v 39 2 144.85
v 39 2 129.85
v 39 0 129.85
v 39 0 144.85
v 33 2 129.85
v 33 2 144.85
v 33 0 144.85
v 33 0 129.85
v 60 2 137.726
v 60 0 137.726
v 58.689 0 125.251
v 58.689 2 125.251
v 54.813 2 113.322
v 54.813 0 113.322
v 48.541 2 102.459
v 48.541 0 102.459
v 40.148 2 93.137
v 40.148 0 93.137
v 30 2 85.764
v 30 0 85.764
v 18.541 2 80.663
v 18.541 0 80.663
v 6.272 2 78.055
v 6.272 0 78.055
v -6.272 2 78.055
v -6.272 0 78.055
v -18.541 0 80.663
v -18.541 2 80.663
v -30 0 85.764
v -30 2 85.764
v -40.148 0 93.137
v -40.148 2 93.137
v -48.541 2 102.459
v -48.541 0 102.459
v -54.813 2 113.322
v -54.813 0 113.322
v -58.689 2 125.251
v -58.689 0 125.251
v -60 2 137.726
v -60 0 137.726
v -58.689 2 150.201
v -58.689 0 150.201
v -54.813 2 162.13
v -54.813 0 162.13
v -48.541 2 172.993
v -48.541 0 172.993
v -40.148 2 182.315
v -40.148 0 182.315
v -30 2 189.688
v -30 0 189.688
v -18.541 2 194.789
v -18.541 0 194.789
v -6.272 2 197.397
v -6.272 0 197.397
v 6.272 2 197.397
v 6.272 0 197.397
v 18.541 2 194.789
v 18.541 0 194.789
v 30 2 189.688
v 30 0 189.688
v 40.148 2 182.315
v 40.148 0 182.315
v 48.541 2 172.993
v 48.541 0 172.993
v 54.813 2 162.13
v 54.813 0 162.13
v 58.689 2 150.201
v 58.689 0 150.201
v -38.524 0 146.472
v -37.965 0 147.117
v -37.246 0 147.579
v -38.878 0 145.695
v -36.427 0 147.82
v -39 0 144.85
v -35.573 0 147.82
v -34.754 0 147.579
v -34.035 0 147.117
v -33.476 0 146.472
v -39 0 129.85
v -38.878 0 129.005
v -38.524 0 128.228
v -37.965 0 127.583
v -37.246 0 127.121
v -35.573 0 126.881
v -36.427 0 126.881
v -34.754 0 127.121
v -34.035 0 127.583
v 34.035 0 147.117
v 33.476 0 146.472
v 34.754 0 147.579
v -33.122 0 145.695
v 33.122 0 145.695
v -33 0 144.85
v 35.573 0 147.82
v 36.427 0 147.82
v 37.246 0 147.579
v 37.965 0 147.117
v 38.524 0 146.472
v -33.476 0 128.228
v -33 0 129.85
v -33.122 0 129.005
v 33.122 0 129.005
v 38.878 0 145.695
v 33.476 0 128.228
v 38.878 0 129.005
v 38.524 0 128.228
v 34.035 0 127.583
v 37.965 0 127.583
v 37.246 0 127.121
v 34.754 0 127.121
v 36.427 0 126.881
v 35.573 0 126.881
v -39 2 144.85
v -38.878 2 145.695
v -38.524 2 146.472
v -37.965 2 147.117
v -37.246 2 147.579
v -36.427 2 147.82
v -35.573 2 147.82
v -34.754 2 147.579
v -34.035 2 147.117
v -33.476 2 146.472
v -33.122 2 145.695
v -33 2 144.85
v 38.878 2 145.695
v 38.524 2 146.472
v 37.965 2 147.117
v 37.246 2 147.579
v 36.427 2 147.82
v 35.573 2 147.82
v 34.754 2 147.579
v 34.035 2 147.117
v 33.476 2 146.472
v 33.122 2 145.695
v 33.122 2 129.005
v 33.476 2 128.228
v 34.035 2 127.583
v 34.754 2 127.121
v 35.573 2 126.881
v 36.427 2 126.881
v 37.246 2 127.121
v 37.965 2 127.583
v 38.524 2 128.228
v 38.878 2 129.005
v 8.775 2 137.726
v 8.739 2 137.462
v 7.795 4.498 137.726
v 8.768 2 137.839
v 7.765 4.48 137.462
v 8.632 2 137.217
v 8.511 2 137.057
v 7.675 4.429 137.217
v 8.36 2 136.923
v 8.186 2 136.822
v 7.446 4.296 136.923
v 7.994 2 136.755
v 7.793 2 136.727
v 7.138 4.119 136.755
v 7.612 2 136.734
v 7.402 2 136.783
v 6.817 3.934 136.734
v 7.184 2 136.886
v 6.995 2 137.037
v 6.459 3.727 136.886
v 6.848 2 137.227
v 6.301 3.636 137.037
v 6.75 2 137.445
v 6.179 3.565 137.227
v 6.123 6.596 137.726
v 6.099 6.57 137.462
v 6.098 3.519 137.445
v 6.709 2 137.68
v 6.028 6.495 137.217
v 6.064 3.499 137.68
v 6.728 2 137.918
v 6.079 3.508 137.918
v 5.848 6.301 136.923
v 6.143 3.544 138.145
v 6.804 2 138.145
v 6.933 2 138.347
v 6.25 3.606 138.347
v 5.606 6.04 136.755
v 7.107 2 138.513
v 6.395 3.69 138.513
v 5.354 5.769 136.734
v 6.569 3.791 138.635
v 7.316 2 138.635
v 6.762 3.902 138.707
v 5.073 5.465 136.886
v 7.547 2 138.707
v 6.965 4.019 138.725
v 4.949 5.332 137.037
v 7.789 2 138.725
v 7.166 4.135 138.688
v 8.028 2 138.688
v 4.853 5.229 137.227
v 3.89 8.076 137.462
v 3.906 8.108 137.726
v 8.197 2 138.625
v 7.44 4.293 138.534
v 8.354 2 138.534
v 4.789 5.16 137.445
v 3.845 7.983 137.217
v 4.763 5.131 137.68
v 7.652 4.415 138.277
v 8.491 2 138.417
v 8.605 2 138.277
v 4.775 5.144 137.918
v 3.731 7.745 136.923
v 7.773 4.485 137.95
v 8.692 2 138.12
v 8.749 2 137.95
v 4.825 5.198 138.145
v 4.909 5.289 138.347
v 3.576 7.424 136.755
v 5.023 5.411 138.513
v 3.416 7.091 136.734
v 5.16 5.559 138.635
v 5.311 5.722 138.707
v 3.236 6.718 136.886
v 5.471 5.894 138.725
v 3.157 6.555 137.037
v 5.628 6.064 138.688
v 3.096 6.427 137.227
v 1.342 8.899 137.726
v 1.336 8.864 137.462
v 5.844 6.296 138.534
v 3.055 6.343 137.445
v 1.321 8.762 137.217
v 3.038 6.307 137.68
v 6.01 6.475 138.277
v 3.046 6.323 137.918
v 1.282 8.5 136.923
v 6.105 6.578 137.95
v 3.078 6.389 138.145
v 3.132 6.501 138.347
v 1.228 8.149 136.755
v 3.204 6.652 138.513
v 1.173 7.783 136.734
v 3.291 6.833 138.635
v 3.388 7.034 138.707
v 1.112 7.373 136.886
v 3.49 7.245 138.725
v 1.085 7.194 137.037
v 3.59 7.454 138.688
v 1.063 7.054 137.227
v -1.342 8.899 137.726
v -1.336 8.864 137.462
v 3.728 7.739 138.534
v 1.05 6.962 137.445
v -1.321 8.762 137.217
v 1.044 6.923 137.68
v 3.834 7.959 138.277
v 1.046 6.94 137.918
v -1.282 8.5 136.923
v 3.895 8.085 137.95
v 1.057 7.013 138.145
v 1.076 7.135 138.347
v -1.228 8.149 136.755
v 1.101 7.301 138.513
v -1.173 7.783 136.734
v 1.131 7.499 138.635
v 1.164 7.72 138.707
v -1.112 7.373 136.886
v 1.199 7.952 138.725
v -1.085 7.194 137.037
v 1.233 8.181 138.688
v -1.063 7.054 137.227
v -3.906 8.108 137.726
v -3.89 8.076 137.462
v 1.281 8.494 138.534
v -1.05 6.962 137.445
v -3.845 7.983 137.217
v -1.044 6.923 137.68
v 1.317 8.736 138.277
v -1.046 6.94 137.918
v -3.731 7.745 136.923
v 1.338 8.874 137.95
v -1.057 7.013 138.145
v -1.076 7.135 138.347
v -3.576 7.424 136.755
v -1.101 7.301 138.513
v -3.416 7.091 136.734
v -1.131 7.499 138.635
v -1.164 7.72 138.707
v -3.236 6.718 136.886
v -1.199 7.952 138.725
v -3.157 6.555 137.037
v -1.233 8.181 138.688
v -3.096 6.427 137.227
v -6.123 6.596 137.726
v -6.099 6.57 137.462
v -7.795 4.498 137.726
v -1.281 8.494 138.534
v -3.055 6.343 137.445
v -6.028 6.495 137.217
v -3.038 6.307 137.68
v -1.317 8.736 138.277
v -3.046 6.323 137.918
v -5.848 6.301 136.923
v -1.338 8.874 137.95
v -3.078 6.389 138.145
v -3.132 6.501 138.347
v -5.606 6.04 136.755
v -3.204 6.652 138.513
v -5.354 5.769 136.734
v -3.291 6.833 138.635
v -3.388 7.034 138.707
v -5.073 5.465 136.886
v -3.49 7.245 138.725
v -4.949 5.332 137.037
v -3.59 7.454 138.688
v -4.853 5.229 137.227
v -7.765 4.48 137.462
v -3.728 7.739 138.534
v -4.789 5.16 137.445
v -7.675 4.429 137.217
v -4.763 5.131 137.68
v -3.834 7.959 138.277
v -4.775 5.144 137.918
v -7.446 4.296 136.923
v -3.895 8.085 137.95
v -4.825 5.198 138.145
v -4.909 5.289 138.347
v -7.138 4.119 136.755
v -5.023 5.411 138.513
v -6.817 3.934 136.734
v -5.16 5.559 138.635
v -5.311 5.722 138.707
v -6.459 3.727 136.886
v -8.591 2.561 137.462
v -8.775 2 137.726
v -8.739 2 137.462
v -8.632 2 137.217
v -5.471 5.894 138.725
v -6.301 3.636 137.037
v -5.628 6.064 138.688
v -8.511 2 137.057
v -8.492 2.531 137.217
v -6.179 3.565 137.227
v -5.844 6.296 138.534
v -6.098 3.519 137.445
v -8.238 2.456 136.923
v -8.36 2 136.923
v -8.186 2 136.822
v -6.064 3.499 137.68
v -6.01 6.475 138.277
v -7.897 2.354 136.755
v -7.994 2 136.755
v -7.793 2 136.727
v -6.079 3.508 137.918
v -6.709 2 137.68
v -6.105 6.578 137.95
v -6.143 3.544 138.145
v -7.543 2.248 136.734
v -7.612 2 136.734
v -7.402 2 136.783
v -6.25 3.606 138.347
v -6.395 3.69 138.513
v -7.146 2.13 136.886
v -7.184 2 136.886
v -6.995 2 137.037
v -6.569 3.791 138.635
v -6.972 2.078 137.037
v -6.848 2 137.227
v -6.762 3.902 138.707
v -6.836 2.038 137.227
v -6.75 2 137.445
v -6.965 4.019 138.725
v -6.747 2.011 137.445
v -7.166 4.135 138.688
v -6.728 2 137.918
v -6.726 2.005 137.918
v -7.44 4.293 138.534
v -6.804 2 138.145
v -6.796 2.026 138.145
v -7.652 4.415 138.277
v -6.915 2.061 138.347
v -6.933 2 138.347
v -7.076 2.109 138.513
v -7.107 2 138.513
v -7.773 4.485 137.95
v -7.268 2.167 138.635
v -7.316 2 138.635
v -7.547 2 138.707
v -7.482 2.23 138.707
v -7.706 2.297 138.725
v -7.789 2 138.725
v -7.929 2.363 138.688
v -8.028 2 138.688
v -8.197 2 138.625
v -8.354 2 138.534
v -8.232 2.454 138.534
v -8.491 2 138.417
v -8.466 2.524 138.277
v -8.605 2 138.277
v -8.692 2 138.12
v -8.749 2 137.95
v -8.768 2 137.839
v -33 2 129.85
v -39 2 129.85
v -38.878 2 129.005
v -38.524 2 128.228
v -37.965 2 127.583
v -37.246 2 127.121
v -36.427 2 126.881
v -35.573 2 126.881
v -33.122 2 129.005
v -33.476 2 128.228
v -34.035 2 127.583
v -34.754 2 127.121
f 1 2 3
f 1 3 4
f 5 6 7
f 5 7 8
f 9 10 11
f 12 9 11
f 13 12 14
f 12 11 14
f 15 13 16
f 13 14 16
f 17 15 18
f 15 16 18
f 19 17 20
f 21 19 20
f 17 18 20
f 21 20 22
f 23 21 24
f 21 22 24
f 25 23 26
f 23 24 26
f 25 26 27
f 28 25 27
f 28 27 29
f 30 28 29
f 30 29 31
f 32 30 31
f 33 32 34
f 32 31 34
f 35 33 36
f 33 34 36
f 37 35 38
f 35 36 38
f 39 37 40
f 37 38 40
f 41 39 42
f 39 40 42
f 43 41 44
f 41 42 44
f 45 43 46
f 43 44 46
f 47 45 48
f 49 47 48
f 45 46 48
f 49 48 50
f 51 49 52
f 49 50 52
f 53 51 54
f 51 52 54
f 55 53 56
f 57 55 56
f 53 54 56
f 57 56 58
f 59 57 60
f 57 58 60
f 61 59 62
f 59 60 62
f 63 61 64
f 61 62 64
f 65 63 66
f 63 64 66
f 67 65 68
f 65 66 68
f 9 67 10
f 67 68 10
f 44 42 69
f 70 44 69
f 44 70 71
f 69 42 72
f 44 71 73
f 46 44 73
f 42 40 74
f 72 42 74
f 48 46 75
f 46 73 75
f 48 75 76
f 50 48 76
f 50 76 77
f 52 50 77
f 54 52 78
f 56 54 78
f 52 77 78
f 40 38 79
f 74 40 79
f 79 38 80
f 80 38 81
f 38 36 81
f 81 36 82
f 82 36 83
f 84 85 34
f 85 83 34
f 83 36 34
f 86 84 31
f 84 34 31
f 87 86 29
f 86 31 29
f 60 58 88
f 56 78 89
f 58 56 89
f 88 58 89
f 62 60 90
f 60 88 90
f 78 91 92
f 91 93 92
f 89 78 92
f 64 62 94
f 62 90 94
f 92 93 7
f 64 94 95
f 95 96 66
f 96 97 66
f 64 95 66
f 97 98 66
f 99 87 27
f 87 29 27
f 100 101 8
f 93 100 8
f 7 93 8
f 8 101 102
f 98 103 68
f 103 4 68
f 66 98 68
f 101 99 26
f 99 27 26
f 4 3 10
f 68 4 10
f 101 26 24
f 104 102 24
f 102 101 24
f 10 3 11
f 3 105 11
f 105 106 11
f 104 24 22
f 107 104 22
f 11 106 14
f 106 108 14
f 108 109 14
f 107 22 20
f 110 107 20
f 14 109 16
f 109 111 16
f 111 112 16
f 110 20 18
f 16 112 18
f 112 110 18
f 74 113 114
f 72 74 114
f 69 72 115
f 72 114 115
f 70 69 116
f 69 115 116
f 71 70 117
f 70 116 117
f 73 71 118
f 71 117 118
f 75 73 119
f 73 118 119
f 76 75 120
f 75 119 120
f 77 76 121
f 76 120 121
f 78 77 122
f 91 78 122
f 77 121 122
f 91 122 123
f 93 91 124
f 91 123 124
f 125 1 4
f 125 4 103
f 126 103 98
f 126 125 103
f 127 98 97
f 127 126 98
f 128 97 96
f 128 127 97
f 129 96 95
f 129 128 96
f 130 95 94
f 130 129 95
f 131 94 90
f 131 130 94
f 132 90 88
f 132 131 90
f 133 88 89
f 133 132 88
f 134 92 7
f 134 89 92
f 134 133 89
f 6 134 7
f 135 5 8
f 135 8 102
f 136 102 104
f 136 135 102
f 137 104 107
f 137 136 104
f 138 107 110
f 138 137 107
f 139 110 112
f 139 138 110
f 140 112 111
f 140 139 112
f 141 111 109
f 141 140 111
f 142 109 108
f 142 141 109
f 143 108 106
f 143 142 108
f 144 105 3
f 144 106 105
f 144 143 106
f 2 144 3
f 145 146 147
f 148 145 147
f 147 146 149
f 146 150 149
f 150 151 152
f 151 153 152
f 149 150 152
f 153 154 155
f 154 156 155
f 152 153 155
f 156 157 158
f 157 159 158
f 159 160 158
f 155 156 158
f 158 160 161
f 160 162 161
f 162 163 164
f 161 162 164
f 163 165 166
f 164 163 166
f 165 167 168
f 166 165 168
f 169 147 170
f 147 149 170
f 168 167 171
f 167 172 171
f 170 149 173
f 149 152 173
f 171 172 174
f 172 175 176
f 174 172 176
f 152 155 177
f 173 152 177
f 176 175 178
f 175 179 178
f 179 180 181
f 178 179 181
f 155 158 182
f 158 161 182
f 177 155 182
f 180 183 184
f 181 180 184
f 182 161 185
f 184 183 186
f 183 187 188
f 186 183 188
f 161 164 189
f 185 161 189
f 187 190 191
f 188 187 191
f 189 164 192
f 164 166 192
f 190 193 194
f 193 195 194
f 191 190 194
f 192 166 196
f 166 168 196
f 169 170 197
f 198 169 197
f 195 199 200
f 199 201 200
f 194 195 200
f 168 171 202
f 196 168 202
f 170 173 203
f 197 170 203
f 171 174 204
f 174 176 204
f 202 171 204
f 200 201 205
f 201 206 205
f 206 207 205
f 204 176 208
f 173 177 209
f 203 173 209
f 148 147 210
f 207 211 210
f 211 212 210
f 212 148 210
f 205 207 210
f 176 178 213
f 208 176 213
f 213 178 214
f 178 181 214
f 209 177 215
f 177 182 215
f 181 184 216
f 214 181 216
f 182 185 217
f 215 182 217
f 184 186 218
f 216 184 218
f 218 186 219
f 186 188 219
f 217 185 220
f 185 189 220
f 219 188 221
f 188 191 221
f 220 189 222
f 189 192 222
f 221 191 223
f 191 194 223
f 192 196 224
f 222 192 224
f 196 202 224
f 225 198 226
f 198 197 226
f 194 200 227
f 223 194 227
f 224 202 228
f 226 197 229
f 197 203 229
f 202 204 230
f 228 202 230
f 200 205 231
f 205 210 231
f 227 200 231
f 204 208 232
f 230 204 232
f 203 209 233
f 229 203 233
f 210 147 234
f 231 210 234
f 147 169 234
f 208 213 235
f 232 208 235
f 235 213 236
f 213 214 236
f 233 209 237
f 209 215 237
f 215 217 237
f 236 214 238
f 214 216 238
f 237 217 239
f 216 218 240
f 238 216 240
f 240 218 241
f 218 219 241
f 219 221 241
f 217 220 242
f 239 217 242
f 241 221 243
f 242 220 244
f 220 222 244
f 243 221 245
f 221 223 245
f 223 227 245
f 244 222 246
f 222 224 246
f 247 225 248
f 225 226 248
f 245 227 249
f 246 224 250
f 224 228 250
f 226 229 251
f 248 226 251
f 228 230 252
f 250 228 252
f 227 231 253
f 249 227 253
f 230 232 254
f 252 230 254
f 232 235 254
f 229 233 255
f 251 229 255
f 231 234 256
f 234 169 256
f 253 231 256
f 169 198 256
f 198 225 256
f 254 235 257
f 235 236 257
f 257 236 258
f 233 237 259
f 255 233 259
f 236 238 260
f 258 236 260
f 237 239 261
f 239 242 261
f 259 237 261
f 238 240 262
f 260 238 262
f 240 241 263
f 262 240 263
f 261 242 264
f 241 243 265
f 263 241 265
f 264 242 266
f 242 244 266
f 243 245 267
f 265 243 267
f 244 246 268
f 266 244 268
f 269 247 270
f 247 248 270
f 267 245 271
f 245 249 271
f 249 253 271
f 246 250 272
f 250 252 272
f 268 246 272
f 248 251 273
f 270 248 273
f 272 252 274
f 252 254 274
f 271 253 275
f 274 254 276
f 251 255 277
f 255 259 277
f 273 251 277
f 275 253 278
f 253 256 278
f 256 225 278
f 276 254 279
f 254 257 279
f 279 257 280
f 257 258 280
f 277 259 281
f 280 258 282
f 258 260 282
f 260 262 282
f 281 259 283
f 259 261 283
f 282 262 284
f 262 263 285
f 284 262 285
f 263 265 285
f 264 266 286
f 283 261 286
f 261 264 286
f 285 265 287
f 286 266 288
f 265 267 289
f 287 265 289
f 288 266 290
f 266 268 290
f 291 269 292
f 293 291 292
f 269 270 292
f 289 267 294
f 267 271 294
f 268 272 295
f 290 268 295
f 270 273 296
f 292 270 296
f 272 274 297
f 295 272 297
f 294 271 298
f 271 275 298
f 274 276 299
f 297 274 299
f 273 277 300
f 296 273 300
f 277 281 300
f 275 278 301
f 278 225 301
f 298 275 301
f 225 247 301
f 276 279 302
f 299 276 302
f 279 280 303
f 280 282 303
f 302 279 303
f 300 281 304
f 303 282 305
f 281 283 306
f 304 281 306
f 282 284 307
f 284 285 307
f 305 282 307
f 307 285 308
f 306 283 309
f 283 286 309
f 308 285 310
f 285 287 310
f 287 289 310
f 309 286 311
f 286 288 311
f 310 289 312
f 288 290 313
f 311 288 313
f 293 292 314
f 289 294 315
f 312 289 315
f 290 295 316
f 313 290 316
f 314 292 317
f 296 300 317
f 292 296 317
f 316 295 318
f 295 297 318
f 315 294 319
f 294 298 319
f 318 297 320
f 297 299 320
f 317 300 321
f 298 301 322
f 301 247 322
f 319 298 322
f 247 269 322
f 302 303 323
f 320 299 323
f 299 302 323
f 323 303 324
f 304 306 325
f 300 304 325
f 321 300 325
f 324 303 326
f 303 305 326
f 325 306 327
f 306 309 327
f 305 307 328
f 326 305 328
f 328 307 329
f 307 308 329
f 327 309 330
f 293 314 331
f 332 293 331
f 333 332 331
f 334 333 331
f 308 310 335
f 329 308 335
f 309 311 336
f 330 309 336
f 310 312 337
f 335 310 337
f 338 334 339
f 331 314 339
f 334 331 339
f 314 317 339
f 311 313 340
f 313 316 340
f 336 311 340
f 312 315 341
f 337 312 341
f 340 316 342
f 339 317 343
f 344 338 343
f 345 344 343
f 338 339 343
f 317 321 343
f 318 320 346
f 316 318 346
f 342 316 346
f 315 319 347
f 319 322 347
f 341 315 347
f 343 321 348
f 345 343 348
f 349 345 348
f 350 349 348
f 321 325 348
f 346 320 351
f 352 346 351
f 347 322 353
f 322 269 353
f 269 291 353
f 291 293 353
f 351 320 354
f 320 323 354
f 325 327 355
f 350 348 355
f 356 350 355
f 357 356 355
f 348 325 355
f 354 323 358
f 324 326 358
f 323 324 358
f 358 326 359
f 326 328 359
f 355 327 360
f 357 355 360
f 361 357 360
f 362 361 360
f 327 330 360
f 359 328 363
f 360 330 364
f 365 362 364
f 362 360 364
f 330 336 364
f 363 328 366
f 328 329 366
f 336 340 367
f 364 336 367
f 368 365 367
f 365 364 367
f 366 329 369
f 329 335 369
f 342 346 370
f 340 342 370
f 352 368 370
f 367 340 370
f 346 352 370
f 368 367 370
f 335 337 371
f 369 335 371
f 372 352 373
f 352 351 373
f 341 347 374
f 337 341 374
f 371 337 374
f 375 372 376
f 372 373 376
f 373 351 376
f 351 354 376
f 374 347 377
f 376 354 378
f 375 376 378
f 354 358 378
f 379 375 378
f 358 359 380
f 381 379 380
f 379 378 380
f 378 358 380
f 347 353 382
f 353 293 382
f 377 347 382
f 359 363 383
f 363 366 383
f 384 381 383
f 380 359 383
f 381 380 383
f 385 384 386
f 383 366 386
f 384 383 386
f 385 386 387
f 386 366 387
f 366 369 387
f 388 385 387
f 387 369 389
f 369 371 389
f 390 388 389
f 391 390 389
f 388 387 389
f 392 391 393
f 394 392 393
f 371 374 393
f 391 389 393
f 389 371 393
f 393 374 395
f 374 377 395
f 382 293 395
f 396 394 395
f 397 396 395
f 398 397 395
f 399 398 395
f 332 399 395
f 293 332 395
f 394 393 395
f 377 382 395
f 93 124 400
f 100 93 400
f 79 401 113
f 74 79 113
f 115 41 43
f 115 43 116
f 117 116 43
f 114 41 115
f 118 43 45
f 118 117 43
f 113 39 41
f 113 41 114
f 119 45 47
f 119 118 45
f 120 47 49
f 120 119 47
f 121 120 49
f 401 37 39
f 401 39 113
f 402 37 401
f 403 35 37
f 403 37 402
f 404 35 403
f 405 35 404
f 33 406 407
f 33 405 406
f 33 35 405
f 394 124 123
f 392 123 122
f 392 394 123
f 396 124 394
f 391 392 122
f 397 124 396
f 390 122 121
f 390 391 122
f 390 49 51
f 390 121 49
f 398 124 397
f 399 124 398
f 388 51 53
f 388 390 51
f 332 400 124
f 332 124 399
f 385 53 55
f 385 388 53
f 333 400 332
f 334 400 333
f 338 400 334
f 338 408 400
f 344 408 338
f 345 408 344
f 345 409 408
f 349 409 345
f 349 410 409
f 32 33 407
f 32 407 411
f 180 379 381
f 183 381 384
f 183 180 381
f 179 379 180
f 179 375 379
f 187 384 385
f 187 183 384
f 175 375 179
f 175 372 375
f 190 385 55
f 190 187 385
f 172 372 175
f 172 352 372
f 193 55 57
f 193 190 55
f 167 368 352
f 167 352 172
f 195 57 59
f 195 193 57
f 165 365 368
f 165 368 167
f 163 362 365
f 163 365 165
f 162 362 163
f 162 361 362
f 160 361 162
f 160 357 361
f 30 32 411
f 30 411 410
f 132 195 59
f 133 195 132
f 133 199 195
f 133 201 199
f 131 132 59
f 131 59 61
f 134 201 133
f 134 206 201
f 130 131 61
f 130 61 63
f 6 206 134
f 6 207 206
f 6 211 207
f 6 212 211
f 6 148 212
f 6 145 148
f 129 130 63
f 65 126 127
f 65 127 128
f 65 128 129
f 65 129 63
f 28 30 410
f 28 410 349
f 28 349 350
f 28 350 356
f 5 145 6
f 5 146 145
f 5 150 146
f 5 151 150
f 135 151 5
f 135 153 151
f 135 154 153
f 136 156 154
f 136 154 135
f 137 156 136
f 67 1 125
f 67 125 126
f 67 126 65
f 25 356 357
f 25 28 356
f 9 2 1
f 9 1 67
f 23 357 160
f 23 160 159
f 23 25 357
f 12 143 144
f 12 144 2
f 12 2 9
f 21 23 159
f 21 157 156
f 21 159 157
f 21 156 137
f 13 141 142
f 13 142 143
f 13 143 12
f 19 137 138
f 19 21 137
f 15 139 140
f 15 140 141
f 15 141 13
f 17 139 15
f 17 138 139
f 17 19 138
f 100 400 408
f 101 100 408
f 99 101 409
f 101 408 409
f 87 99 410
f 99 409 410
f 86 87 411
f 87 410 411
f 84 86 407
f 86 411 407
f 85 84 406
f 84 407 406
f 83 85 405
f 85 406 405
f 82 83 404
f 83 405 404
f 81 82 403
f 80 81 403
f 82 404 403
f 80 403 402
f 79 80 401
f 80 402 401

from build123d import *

# Parameters (mm, degrees)
SKETCH1_R           = 60
BOSS_EXTRUDE1_DEPTH = 2
SKETCH3_R           = 1
REVOLVE1_ANGLE      = 180
CUT_EXTRUDE1_DEPTH  = 10


with BuildPart() as part:
    # Sketch1 → Boss-Extrude1 (new body)
    with BuildSketch(Plane(origin=(0, 0, 0), x_dir=(1, 0, 0), z_dir=(0, 1, 0))):
        with Locations((0, -137.725986214)):
            Circle(SKETCH1_R)
    extrude(amount=BOSS_EXTRUDE1_DEPTH)

    # Sketch3 → Revolve1 (revolve)
    with BuildSketch(Plane(origin=(0, 0, 0), x_dir=(1, 0, 0), z_dir=(0, 1, 0))):
        with Locations((8, -137.725986214)):
            Circle(SKETCH3_R)
    revolve(axis=Axis((0, 0, 77.725986214), (0, 0, 1)), revolution_arc=REVOLVE1_ANGLE)

    # Sketch4 → Cut-Extrude1 (cut)
    with BuildSketch(Plane(origin=(0, 2, 0), x_dir=(1, 0, 0), z_dir=(0, 1, 0))):
        with BuildLine():
            Line((39, -129.850097306), (39, -144.850097306))
            ThreePointArc((39, -144.850097306), (36, -147.850097306), (33, -144.850097306))
            Line((33, -144.850097306), (33, -129.850097306))
            ThreePointArc((33, -129.850097306), (36, -126.850097306), (39, -129.850097306))
        make_face()
        with BuildLine():
            Line((-39, -129.850097306), (-39, -144.850097306))
            ThreePointArc((-39, -144.850097306), (-36, -147.850097306), (-33, -144.850097306))
            Line((-33, -144.850097306), (-33, -129.850097306))
            ThreePointArc((-33, -129.850097306), (-36, -126.850097306), (-39, -129.850097306))
        make_face()
    extrude(amount=-CUT_EXTRUDE1_DEPTH, mode=Mode.SUBTRACT)


solid = part.part
